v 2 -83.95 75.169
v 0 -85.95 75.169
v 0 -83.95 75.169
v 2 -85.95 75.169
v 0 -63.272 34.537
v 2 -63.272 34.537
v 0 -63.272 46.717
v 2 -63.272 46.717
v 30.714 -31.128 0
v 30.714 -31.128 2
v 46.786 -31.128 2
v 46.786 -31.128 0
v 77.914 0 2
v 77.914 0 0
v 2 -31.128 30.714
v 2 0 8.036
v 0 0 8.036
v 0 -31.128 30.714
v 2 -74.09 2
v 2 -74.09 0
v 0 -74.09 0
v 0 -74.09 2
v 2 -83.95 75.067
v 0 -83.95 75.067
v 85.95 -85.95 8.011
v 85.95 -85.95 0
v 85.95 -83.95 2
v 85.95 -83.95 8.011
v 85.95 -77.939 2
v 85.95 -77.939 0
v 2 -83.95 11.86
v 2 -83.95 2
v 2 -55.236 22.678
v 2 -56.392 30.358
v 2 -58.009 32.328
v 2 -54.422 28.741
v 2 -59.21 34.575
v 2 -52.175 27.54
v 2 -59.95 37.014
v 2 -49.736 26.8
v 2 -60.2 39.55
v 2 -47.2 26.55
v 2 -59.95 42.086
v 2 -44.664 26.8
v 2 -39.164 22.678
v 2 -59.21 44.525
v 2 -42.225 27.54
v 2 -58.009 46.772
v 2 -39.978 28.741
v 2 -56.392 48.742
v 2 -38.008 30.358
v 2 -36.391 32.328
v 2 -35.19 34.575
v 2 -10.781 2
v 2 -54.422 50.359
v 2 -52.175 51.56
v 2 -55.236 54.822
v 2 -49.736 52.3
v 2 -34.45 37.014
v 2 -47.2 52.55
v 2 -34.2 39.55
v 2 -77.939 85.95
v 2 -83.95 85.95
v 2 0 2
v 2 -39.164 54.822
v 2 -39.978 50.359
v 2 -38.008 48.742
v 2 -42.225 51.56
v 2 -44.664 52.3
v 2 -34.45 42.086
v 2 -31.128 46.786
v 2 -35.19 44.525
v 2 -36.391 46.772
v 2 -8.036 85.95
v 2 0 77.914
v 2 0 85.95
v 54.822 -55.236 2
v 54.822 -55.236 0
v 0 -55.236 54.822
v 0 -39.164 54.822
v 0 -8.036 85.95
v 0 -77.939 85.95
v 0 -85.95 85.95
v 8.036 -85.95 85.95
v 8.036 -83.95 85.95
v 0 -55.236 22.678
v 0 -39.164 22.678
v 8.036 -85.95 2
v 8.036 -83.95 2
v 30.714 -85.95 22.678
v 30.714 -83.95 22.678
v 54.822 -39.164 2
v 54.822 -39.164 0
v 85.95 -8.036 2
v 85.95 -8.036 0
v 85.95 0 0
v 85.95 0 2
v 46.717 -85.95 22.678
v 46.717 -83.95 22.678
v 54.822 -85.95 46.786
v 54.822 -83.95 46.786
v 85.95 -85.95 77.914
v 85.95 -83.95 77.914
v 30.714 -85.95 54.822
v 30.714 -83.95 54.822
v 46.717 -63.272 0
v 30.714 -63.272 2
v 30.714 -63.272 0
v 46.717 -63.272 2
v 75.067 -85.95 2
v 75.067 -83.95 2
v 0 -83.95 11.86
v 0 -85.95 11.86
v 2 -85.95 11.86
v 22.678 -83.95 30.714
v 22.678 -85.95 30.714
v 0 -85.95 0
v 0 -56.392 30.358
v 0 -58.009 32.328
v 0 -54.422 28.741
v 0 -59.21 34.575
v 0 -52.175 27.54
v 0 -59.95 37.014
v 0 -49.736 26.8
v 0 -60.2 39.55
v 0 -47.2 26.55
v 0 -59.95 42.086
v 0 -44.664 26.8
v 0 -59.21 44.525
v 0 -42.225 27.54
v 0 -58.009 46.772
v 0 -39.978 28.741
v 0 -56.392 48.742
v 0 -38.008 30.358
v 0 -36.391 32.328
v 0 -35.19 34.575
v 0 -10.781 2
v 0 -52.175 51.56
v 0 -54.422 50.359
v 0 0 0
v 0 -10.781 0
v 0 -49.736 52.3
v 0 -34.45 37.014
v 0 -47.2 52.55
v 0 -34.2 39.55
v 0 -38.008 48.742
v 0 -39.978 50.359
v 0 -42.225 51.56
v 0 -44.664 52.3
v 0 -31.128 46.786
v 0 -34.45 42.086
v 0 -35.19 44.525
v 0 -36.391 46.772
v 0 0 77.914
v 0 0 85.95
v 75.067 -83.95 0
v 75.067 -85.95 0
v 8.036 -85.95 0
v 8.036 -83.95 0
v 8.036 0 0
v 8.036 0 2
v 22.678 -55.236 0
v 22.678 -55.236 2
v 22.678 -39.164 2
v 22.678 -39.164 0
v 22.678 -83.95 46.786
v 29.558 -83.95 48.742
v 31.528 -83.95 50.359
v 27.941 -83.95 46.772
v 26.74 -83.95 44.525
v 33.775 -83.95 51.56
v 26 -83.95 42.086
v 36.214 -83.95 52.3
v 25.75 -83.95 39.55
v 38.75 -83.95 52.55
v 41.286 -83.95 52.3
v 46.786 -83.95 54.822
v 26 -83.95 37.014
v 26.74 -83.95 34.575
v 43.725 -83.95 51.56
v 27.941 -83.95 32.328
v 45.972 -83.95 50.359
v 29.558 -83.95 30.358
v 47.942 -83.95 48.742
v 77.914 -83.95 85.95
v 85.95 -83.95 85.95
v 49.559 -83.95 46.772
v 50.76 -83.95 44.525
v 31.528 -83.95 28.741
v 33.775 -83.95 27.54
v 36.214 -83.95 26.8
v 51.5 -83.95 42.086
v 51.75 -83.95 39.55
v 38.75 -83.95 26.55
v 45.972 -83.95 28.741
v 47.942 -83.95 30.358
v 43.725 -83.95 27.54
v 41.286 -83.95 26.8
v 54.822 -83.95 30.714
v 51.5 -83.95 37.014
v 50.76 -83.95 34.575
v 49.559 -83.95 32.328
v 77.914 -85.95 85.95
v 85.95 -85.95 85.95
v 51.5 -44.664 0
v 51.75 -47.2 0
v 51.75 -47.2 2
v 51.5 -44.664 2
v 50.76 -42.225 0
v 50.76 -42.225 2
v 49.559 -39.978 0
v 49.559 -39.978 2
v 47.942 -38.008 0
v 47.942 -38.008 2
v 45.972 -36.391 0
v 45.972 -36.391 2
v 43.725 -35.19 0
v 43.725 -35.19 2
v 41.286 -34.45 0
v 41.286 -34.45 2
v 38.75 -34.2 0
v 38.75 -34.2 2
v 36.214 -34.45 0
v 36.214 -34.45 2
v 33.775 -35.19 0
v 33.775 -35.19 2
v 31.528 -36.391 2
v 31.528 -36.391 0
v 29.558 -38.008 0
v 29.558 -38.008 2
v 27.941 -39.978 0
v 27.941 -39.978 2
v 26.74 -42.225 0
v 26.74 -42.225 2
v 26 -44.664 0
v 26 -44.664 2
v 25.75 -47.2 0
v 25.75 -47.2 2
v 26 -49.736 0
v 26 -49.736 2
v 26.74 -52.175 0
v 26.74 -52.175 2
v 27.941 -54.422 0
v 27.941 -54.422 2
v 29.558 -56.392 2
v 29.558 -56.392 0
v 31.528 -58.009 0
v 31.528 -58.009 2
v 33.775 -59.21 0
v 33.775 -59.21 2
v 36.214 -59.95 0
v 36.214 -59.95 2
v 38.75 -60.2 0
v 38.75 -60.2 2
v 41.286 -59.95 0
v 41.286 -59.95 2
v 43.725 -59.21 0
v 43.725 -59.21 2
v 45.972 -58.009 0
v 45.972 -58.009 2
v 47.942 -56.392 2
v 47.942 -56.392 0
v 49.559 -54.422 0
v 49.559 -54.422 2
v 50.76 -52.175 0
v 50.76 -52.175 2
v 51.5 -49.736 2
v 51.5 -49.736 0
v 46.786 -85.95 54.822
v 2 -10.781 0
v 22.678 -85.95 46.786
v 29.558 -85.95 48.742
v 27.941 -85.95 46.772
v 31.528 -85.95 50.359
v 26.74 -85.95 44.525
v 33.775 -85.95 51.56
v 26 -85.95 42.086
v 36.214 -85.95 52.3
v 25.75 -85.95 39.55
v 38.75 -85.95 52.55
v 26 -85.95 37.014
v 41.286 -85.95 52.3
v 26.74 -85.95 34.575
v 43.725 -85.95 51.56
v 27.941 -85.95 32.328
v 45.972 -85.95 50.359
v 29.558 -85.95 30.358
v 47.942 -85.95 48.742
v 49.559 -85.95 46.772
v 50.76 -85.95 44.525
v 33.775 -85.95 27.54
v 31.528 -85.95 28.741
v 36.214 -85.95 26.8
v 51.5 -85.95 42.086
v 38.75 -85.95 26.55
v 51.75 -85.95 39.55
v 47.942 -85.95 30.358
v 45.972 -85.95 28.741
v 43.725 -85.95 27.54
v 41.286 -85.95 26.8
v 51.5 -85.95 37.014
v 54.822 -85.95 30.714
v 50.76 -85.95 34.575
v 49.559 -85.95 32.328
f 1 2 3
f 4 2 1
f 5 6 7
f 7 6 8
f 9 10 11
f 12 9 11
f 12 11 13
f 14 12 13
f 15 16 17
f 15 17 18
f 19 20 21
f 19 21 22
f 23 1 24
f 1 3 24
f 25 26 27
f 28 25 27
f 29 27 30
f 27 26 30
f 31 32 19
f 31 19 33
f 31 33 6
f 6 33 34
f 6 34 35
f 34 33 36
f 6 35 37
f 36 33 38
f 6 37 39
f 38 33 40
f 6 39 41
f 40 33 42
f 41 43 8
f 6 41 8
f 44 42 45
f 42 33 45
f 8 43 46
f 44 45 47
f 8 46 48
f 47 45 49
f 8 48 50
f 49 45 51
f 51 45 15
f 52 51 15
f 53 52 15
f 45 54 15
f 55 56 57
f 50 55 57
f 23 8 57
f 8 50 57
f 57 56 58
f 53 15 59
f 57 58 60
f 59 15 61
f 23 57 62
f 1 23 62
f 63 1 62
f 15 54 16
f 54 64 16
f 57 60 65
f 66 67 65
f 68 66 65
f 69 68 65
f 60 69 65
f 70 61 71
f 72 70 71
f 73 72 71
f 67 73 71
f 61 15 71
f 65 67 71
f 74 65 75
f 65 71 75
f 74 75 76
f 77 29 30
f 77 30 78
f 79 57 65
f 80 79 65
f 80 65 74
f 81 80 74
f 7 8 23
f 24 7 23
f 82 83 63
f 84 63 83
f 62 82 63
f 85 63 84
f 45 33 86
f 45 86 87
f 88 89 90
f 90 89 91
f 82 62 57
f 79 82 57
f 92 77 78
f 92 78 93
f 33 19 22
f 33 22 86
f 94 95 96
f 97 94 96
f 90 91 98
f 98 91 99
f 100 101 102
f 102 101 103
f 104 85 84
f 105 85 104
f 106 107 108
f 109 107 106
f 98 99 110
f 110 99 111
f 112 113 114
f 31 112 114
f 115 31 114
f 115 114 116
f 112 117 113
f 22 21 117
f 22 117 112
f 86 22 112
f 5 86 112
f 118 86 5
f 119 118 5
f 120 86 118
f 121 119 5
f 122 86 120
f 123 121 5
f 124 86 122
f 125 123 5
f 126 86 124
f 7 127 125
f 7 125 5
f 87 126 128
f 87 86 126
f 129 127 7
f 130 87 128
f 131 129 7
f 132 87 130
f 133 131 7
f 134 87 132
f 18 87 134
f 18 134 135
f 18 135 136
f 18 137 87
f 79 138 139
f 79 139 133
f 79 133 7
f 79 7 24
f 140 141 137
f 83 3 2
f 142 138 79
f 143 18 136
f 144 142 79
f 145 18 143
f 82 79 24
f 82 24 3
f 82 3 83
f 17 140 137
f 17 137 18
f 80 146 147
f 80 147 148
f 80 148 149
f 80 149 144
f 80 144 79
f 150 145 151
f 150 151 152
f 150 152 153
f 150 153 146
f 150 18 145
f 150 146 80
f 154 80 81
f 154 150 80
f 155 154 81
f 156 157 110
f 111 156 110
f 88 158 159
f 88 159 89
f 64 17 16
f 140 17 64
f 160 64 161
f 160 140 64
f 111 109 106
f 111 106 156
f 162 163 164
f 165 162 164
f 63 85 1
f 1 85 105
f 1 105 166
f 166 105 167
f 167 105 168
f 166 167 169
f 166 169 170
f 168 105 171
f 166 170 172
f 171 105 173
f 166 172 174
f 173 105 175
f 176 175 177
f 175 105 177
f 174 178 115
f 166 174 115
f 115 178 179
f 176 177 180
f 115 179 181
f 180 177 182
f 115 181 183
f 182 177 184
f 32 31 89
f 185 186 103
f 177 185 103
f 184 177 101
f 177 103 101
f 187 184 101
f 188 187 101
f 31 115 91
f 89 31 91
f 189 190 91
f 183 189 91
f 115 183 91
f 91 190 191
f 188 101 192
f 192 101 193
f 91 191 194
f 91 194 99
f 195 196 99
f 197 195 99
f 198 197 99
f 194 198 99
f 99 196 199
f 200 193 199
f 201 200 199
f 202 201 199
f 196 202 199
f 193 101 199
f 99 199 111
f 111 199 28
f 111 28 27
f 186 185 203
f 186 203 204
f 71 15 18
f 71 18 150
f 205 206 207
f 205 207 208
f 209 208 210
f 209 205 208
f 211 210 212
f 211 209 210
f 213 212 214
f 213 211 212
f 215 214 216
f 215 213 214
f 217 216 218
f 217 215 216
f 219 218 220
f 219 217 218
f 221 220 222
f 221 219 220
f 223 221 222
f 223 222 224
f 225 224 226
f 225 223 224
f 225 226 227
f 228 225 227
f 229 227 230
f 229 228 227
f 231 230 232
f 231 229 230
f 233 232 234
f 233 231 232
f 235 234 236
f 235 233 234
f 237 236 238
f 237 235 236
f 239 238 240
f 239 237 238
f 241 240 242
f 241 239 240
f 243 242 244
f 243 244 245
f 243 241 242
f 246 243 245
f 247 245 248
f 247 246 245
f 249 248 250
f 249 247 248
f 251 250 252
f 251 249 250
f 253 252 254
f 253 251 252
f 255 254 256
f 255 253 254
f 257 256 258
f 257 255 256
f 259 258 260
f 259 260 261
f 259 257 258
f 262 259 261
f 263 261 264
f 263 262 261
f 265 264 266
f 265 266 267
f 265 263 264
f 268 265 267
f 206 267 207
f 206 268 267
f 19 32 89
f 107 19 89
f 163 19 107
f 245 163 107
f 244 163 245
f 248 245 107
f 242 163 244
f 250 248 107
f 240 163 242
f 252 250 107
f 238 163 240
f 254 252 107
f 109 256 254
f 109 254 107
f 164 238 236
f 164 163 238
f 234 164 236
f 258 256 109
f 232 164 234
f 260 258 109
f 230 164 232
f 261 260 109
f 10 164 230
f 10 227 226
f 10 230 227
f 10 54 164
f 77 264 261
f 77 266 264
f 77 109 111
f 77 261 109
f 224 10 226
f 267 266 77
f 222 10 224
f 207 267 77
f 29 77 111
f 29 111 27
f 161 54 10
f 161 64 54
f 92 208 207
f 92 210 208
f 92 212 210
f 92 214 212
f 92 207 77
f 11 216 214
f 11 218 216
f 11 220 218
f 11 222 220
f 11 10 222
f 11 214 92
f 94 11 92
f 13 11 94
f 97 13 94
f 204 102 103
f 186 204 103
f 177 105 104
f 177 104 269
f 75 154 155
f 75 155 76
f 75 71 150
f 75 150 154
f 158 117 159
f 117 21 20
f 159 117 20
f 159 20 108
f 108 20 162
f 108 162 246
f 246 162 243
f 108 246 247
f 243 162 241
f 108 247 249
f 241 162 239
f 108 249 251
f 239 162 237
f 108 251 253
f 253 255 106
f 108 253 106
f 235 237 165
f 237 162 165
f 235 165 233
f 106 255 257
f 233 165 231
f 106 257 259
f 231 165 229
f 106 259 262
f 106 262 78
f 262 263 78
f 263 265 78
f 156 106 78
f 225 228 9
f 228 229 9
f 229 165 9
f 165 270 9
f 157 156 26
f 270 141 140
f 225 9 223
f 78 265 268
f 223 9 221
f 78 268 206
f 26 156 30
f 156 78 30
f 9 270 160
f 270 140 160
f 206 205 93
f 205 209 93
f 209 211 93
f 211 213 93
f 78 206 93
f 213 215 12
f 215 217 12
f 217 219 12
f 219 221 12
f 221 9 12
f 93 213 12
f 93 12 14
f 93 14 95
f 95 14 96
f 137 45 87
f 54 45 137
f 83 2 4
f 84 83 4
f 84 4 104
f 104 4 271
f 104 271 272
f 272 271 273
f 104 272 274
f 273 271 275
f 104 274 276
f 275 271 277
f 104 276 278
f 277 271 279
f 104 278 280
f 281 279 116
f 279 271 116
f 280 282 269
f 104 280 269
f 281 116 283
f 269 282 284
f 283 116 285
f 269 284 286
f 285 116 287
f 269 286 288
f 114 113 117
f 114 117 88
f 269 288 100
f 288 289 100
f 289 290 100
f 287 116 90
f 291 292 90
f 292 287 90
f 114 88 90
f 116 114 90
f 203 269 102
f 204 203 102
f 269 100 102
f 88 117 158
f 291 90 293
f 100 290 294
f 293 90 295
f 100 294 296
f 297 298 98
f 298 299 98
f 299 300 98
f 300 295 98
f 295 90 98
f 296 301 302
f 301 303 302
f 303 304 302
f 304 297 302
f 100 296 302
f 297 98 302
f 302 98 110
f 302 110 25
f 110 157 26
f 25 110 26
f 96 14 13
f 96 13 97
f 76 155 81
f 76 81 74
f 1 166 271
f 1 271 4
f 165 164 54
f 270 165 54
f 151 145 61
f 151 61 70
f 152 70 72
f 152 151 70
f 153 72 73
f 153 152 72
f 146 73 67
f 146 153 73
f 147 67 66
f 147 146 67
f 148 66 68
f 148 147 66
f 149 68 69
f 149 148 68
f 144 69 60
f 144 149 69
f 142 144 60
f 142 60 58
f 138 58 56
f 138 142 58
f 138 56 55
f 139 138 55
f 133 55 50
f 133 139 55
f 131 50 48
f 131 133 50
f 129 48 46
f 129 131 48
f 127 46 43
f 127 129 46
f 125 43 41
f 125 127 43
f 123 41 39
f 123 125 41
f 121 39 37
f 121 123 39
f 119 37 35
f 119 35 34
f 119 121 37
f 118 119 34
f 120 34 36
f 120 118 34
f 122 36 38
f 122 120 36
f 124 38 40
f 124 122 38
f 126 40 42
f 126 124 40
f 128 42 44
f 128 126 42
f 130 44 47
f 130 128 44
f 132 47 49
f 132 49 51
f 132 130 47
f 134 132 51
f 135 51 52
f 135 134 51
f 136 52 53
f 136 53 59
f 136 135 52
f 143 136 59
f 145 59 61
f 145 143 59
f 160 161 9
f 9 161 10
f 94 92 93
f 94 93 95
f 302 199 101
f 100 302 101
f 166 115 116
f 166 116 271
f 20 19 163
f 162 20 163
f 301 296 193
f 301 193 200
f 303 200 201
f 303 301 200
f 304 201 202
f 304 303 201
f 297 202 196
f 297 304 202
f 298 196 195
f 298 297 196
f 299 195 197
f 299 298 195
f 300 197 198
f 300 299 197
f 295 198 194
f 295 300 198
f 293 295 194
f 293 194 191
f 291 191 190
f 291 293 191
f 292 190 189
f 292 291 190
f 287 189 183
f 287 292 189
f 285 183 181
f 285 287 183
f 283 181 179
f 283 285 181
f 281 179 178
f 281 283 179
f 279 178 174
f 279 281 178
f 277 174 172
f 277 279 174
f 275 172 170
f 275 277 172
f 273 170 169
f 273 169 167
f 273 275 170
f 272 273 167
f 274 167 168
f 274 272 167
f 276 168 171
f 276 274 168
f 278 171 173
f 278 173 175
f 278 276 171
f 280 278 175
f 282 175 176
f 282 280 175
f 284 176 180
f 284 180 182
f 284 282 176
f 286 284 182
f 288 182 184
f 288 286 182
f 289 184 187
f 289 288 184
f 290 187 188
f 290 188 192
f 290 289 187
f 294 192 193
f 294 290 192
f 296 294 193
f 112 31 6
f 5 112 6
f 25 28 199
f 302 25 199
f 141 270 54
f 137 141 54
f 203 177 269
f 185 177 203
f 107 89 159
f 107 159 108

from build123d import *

# Parameters (mm, degrees)
SKETCH1_W           = 85.95
SKETCH1_H           = 85.95
BOSS_EXTRUDE1_DEPTH = 85.95
SKETCH2_W           = 83.95
SKETCH2_H           = 83.95
CUT_EXTRUDE1_DEPTH  = 83.95
CAVITY1_OUTLINE_R   = 13
CAVITY1_DEPTH       = 2
CAVITY2_OUTLINE_R   = 13
CAVITY2_DEPTH       = 2
CAVITY4_START       = -85.95
CAVITY4_OUTLINE_R   = 13
CAVITY4_DEPTH       = 2
CUT_EXTRUDE3_DEPTH  = 148.724092483
BOSS_EXTRUDE2_DEPTH = 2
CUT_EXTRUDE4_REACH  = 150.87
SKETCH8_W           = 2
SKETCH8_H           = 63.308692683
CUT_EXTRUDE5_REACH  = 150.87
SKETCH9_W           = 67.031257487
SKETCH9_H           = 2
CUT_EXTRUDE6_START  = -2
SKETCH10_W          = 2
SKETCH10_H          = 63.308692683
CUT_EXTRUDE6_DEPTH  = 2


# Read off the part's stored shape, not the designer's step: Cavity1, Cavity2, Cavity4
with BuildPart() as part:
    # Sketch1 → Boss-Extrude1 (new body)
    with BuildSketch(Plane.XY):
        with Locations((42.975, -42.975)):
            Rectangle(SKETCH1_W, SKETCH1_H)
    extrude(amount=BOSS_EXTRUDE1_DEPTH)

    # Sketch2 → Cut-Extrude1 (cut)
    with BuildSketch(Plane(origin=(0, 0, 0), x_dir=(1, 0, 0), z_dir=(0, 1, 0))):
        with Locations((43.975, -43.975)):
            Rectangle(SKETCH2_W, SKETCH2_H)
    extrude(amount=-CUT_EXTRUDE1_DEPTH, mode=Mode.SUBTRACT)

    # Cavity1 outline → Cavity1 (cut)
    with BuildSketch(Plane.XY):
        with Locations((38.75, -47.2)):
            Circle(CAVITY1_OUTLINE_R)
    extrude(amount=CAVITY1_DEPTH, mode=Mode.SUBTRACT)

    # Cavity2 outline → Cavity2 (cut)
    with BuildSketch(Plane.YZ):
        with Locations((-47.2, 39.55)):
            Circle(CAVITY2_OUTLINE_R)
    extrude(amount=CAVITY2_DEPTH, mode=Mode.SUBTRACT)

    # Cavity4 outline → Cavity4 (cut)
    with BuildSketch(Plane(origin=(0, 0, 0), x_dir=(1, 0, 0), z_dir=(0, 1, 0)).offset(CAVITY4_START)):
        with Locations((38.75, -39.55)):
            Circle(CAVITY4_OUTLINE_R)
    extrude(amount=CAVITY4_DEPTH, mode=Mode.SUBTRACT)

    # Sketch4 → Cut-Extrude3 (cut, through all)
    with BuildSketch(Plane.XY.offset(2)):
        Polygon((46.786231243, -31.127537514), (77.913768757, 0), (8.036231243, 0), (30.713768757, -31.127537514), align=None)
        Polygon((54.822462486, -39.163768757), (85.95, -8.036231243), (85.95, -77.939325412), (54.822462486, -55.236231243), align=None)
        Polygon((46.717131732, -63.272462486), (75.06748873, -83.95), (8.036231243, -83.95), (30.713768757, -63.272462486), align=None)
        Polygon((22.677537514, -39.163768757), (2, -10.781462068), (2, -74.090154751), (22.677537514, -55.236231243), align=None)
    cut_extrude3 = extrude(amount=-CUT_EXTRUDE3_DEPTH, mode=Mode.SUBTRACT)

    # Mirror1: Cut-Extrude3 across plane
    add(cut_extrude3.mirror(Plane(origin=(0, -42.975, 42.975), x_dir=(0, 0.7071067811865475, 0.7071067811865477), z_dir=(0, 0.7071067811865476, -0.7071067811865475))), mode=Mode.SUBTRACT)

    # Mirror2: Cut-Extrude3 across plane
    add(cut_extrude3.mirror(Plane(origin=(0, 0, 0), x_dir=(0.7071067811865478, 0, 0.7071067811865472), z_dir=(-0.7071067811865475, 0, 0.7071067811865477))), mode=Mode.SUBTRACT)

    # Sketch6 → Boss-Extrude2 (add)
    with BuildSketch(Plane(origin=(2, 0, 0), x_dir=(0, 0, -1), z_dir=(1, 0, 0))):
        Polygon((-8.036231243, -83.95), (-11.859845249, -83.95), (-34.537382763, -63.272462486), (-30.713768757, -63.272462486), align=None)
    extrude(amount=-BOSS_EXTRUDE2_DEPTH)

    # Cut-Extrude4: up to this face of the body (flat: up to its plane)
    cut_extrude4_end = Plane(part.part.faces().sort_by_distance((18.575077405, -83.95, 13.216062518))[0])
    # Sketch8 → Cut-Extrude4 (cut, up to the picked face)
    with BuildSketch(Plane.XZ.offset(85.95), mode=Mode.PRIVATE) as cut_extrude4_sk1:
        with Locations((1, 43.514191591)):
            Rectangle(SKETCH8_W, SKETCH8_H)
    cut_extrude4_tool1 = split(extrude(cut_extrude4_sk1.sketch, amount=-CUT_EXTRUDE4_REACH, mode=Mode.PRIVATE), bisect_by=cut_extrude4_end, keep=Keep.BOTH, mode=Mode.PRIVATE)
    add(cut_extrude4_tool1.solids().sort_by(Axis((1, -85.95, 43.514192), (0, 1, 0)))[0], mode=Mode.SUBTRACT)

    # Cut-Extrude5: up to this face of the body (flat: up to its plane)
    cut_extrude5_end = Plane(part.part.faces().sort_by_distance((41.551859986, -83.95, 1))[0])
    # Sketch9 → Cut-Extrude5 (cut, up to the picked face)
    with BuildSketch(Plane.XZ.offset(85.95), mode=Mode.PRIVATE) as cut_extrude5_sk1:
        with Locations((41.551859987, 1)):
            Rectangle(SKETCH9_W, SKETCH9_H)
    cut_extrude5_tool1 = split(extrude(cut_extrude5_sk1.sketch, amount=-CUT_EXTRUDE5_REACH, mode=Mode.PRIVATE), bisect_by=cut_extrude5_end, keep=Keep.BOTH, mode=Mode.PRIVATE)
    add(cut_extrude5_tool1.solids().sort_by(Axis((41.55186, -85.95, 1), (0, 1, 0)))[0], mode=Mode.SUBTRACT)

    # Sketch10 → Cut-Extrude6 (cut)
    with BuildSketch(Plane.ZY.offset(CUT_EXTRUDE6_START)):
        with Locations((1, -42.435808409)):
            Rectangle(SKETCH10_W, SKETCH10_H)
    extrude(amount=CUT_EXTRUDE6_DEPTH, mode=Mode.SUBTRACT)


solid = part.part
